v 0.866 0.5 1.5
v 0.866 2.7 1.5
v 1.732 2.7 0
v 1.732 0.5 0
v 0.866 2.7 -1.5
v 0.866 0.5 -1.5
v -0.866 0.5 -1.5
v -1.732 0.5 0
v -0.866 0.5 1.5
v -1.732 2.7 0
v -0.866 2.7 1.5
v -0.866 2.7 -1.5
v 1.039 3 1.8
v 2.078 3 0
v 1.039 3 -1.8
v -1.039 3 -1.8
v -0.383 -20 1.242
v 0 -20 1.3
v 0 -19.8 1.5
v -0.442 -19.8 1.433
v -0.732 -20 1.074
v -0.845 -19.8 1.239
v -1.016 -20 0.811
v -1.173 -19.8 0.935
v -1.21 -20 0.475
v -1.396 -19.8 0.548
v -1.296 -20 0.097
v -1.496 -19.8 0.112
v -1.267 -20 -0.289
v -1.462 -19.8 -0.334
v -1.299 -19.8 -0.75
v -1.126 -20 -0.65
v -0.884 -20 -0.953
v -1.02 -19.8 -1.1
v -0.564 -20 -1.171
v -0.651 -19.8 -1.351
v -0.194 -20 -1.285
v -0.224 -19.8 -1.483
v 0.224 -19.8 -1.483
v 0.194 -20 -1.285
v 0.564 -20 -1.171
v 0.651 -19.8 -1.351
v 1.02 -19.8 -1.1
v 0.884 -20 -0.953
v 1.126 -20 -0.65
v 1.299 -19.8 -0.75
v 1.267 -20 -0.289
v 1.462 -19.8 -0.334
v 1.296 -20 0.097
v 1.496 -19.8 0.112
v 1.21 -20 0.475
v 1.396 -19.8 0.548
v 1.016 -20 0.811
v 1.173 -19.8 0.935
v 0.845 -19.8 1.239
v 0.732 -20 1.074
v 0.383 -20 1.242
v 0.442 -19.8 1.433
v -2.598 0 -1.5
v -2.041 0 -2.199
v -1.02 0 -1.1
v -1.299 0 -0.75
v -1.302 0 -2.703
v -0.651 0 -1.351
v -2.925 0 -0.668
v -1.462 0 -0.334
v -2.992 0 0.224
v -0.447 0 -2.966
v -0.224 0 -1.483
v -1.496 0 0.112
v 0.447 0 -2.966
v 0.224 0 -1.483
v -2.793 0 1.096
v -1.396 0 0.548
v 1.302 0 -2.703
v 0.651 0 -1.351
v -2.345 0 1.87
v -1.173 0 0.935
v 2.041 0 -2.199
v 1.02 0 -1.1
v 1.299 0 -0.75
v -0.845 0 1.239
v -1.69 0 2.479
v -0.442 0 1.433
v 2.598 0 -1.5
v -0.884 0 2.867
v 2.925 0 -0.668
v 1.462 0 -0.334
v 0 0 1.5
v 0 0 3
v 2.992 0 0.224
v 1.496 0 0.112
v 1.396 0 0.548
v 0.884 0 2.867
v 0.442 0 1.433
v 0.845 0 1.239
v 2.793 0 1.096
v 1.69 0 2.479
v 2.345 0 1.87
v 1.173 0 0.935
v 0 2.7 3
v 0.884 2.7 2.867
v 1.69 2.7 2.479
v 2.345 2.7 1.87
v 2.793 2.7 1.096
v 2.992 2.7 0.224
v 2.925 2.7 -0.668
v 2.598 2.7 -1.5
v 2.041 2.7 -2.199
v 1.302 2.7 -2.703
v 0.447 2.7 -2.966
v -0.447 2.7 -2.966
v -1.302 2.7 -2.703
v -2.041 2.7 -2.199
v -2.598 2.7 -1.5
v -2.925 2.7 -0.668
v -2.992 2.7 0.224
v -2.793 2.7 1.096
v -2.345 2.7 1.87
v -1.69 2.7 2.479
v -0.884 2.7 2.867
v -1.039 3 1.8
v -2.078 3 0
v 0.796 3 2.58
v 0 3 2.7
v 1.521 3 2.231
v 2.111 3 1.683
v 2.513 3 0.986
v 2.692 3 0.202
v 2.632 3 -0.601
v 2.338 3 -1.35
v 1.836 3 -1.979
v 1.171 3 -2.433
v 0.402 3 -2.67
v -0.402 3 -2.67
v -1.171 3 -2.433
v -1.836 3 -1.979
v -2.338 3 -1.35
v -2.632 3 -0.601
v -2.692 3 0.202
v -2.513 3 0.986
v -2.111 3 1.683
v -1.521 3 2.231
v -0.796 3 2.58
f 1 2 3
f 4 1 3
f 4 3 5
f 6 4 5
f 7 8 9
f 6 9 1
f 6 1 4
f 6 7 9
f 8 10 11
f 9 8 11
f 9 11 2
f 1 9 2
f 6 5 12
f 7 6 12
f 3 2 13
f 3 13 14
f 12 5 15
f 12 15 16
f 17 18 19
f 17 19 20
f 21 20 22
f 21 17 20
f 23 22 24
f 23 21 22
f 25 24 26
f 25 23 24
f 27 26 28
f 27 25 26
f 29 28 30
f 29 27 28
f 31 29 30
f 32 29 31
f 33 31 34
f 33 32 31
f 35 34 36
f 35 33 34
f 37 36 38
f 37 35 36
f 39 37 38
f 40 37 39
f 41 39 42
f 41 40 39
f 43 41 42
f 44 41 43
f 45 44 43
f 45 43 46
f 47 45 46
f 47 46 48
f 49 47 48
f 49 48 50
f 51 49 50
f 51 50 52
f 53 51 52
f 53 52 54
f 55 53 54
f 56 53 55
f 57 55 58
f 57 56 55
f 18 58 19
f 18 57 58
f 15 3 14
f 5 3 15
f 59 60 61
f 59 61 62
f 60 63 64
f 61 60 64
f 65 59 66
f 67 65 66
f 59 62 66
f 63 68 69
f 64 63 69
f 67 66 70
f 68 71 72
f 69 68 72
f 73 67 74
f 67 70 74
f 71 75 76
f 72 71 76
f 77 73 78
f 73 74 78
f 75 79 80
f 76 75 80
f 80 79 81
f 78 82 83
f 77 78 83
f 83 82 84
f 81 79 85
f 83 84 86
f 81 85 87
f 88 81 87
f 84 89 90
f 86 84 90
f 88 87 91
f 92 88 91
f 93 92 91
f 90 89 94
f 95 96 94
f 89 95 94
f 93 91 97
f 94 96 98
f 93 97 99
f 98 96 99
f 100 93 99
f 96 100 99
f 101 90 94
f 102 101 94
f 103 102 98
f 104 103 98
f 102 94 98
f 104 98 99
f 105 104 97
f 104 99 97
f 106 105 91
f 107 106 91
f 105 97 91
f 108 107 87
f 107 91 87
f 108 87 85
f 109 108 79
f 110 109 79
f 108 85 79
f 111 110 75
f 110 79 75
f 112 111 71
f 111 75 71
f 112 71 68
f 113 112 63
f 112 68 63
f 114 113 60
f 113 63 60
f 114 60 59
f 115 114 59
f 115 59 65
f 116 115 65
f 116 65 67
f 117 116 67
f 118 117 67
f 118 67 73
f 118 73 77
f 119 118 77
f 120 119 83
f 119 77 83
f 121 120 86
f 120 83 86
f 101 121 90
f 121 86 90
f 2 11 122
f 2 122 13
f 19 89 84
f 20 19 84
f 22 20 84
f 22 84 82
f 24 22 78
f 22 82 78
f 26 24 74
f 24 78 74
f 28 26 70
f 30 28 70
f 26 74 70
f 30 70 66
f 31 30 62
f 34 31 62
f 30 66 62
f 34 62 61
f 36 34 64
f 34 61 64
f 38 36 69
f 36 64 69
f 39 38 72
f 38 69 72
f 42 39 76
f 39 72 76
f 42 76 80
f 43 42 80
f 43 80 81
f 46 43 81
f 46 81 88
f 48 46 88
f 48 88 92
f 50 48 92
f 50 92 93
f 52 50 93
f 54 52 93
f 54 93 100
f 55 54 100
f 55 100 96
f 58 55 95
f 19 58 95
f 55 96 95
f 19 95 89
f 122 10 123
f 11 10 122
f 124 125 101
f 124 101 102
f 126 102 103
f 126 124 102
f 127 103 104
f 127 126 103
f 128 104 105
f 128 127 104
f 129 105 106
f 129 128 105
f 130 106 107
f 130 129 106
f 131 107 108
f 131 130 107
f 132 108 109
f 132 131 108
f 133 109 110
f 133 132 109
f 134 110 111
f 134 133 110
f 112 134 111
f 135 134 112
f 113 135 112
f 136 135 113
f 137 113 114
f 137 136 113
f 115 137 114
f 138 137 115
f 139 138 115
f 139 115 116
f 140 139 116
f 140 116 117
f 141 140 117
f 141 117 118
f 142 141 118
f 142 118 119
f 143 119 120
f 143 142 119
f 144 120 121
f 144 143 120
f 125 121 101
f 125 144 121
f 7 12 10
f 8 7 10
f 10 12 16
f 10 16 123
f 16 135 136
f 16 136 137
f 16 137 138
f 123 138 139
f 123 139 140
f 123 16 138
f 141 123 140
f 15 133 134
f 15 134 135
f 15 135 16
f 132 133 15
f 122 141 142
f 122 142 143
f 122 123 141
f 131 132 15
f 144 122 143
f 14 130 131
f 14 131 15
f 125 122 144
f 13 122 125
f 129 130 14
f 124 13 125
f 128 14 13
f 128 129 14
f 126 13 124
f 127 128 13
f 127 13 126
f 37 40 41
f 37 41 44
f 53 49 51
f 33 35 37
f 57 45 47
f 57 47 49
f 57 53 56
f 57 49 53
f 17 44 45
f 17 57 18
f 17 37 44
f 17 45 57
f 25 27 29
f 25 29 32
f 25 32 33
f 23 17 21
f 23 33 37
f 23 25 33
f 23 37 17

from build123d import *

# Parameters (mm, degrees)
SKETCH1_R           = 3
BOSS_EXTRUDE1_DEPTH = 3
CHAMFER1_SIZE       = 0.3
CUT_EXTRUDE1_DEPTH  = 2.5
CHAMFER2_SIZE       = 0.3
SKETCH3_R           = 1.5
BOSS_EXTRUDE2_DEPTH = 20
CHAMFER3_SIZE       = 0.2


with BuildPart() as part:
    # Sketch1 → Boss-Extrude1 (new body)
    with BuildSketch(Plane(origin=(0, 0, 0), x_dir=(1, 0, 0), z_dir=(0, 1, 0))):
        with Locations(Location((0, 0, 0), (0, 0, 270))):  # turned: the seam where the file's is
            Circle(SKETCH1_R)
    extrude(amount=BOSS_EXTRUDE1_DEPTH)

    # Chamfer1
    chamfer1_edges = [part.edges().sort_by_distance(p)[0] for p in [
        (0, 3, -3),
    ]]
    chamfer(chamfer1_edges, length=CHAMFER1_SIZE)

    # Sketch2 → Cut-Extrude1 (cut)
    with BuildSketch(Plane(origin=(0, 3, 0), x_dir=(1, 0, 0), z_dir=(0, 1, 0))):
        Polygon((1.732050808, 0), (0.866025404, 1.5), (-0.866025404, 1.5), (-1.732050808, 0), (-0.866025404, -1.5), (0.866025404, -1.5), align=None)
    extrude(amount=-CUT_EXTRUDE1_DEPTH, mode=Mode.SUBTRACT)

    # Chamfer2
    chamfer2_edges = [part.edges().sort_by_distance(p)[0] for p in [
        (1.299038106, 3, 0.75),
        (1.299038106, 3, -0.75),
        (0, 3, -1.5),
        (-1.299038106, 3, -0.75),
        (-1.299038106, 3, 0.75),
        (0, 3, 1.5),
    ]]
    chamfer(chamfer2_edges, length=CHAMFER2_SIZE)

    # Sketch3 → Boss-Extrude2 (add)
    with BuildSketch(Plane.XZ):
        with Locations(Location((0, 0, 0), (0, 0, 90))):  # turned: the seam where the file's is
            Circle(SKETCH3_R)
    extrude(amount=BOSS_EXTRUDE2_DEPTH)

    # Chamfer3
    chamfer3_edges = [part.edges().sort_by_distance(p)[0] for p in [
        (0, -20, -1.5),
    ]]
    chamfer(chamfer3_edges, length=CHAMFER3_SIZE)


solid = part.part
